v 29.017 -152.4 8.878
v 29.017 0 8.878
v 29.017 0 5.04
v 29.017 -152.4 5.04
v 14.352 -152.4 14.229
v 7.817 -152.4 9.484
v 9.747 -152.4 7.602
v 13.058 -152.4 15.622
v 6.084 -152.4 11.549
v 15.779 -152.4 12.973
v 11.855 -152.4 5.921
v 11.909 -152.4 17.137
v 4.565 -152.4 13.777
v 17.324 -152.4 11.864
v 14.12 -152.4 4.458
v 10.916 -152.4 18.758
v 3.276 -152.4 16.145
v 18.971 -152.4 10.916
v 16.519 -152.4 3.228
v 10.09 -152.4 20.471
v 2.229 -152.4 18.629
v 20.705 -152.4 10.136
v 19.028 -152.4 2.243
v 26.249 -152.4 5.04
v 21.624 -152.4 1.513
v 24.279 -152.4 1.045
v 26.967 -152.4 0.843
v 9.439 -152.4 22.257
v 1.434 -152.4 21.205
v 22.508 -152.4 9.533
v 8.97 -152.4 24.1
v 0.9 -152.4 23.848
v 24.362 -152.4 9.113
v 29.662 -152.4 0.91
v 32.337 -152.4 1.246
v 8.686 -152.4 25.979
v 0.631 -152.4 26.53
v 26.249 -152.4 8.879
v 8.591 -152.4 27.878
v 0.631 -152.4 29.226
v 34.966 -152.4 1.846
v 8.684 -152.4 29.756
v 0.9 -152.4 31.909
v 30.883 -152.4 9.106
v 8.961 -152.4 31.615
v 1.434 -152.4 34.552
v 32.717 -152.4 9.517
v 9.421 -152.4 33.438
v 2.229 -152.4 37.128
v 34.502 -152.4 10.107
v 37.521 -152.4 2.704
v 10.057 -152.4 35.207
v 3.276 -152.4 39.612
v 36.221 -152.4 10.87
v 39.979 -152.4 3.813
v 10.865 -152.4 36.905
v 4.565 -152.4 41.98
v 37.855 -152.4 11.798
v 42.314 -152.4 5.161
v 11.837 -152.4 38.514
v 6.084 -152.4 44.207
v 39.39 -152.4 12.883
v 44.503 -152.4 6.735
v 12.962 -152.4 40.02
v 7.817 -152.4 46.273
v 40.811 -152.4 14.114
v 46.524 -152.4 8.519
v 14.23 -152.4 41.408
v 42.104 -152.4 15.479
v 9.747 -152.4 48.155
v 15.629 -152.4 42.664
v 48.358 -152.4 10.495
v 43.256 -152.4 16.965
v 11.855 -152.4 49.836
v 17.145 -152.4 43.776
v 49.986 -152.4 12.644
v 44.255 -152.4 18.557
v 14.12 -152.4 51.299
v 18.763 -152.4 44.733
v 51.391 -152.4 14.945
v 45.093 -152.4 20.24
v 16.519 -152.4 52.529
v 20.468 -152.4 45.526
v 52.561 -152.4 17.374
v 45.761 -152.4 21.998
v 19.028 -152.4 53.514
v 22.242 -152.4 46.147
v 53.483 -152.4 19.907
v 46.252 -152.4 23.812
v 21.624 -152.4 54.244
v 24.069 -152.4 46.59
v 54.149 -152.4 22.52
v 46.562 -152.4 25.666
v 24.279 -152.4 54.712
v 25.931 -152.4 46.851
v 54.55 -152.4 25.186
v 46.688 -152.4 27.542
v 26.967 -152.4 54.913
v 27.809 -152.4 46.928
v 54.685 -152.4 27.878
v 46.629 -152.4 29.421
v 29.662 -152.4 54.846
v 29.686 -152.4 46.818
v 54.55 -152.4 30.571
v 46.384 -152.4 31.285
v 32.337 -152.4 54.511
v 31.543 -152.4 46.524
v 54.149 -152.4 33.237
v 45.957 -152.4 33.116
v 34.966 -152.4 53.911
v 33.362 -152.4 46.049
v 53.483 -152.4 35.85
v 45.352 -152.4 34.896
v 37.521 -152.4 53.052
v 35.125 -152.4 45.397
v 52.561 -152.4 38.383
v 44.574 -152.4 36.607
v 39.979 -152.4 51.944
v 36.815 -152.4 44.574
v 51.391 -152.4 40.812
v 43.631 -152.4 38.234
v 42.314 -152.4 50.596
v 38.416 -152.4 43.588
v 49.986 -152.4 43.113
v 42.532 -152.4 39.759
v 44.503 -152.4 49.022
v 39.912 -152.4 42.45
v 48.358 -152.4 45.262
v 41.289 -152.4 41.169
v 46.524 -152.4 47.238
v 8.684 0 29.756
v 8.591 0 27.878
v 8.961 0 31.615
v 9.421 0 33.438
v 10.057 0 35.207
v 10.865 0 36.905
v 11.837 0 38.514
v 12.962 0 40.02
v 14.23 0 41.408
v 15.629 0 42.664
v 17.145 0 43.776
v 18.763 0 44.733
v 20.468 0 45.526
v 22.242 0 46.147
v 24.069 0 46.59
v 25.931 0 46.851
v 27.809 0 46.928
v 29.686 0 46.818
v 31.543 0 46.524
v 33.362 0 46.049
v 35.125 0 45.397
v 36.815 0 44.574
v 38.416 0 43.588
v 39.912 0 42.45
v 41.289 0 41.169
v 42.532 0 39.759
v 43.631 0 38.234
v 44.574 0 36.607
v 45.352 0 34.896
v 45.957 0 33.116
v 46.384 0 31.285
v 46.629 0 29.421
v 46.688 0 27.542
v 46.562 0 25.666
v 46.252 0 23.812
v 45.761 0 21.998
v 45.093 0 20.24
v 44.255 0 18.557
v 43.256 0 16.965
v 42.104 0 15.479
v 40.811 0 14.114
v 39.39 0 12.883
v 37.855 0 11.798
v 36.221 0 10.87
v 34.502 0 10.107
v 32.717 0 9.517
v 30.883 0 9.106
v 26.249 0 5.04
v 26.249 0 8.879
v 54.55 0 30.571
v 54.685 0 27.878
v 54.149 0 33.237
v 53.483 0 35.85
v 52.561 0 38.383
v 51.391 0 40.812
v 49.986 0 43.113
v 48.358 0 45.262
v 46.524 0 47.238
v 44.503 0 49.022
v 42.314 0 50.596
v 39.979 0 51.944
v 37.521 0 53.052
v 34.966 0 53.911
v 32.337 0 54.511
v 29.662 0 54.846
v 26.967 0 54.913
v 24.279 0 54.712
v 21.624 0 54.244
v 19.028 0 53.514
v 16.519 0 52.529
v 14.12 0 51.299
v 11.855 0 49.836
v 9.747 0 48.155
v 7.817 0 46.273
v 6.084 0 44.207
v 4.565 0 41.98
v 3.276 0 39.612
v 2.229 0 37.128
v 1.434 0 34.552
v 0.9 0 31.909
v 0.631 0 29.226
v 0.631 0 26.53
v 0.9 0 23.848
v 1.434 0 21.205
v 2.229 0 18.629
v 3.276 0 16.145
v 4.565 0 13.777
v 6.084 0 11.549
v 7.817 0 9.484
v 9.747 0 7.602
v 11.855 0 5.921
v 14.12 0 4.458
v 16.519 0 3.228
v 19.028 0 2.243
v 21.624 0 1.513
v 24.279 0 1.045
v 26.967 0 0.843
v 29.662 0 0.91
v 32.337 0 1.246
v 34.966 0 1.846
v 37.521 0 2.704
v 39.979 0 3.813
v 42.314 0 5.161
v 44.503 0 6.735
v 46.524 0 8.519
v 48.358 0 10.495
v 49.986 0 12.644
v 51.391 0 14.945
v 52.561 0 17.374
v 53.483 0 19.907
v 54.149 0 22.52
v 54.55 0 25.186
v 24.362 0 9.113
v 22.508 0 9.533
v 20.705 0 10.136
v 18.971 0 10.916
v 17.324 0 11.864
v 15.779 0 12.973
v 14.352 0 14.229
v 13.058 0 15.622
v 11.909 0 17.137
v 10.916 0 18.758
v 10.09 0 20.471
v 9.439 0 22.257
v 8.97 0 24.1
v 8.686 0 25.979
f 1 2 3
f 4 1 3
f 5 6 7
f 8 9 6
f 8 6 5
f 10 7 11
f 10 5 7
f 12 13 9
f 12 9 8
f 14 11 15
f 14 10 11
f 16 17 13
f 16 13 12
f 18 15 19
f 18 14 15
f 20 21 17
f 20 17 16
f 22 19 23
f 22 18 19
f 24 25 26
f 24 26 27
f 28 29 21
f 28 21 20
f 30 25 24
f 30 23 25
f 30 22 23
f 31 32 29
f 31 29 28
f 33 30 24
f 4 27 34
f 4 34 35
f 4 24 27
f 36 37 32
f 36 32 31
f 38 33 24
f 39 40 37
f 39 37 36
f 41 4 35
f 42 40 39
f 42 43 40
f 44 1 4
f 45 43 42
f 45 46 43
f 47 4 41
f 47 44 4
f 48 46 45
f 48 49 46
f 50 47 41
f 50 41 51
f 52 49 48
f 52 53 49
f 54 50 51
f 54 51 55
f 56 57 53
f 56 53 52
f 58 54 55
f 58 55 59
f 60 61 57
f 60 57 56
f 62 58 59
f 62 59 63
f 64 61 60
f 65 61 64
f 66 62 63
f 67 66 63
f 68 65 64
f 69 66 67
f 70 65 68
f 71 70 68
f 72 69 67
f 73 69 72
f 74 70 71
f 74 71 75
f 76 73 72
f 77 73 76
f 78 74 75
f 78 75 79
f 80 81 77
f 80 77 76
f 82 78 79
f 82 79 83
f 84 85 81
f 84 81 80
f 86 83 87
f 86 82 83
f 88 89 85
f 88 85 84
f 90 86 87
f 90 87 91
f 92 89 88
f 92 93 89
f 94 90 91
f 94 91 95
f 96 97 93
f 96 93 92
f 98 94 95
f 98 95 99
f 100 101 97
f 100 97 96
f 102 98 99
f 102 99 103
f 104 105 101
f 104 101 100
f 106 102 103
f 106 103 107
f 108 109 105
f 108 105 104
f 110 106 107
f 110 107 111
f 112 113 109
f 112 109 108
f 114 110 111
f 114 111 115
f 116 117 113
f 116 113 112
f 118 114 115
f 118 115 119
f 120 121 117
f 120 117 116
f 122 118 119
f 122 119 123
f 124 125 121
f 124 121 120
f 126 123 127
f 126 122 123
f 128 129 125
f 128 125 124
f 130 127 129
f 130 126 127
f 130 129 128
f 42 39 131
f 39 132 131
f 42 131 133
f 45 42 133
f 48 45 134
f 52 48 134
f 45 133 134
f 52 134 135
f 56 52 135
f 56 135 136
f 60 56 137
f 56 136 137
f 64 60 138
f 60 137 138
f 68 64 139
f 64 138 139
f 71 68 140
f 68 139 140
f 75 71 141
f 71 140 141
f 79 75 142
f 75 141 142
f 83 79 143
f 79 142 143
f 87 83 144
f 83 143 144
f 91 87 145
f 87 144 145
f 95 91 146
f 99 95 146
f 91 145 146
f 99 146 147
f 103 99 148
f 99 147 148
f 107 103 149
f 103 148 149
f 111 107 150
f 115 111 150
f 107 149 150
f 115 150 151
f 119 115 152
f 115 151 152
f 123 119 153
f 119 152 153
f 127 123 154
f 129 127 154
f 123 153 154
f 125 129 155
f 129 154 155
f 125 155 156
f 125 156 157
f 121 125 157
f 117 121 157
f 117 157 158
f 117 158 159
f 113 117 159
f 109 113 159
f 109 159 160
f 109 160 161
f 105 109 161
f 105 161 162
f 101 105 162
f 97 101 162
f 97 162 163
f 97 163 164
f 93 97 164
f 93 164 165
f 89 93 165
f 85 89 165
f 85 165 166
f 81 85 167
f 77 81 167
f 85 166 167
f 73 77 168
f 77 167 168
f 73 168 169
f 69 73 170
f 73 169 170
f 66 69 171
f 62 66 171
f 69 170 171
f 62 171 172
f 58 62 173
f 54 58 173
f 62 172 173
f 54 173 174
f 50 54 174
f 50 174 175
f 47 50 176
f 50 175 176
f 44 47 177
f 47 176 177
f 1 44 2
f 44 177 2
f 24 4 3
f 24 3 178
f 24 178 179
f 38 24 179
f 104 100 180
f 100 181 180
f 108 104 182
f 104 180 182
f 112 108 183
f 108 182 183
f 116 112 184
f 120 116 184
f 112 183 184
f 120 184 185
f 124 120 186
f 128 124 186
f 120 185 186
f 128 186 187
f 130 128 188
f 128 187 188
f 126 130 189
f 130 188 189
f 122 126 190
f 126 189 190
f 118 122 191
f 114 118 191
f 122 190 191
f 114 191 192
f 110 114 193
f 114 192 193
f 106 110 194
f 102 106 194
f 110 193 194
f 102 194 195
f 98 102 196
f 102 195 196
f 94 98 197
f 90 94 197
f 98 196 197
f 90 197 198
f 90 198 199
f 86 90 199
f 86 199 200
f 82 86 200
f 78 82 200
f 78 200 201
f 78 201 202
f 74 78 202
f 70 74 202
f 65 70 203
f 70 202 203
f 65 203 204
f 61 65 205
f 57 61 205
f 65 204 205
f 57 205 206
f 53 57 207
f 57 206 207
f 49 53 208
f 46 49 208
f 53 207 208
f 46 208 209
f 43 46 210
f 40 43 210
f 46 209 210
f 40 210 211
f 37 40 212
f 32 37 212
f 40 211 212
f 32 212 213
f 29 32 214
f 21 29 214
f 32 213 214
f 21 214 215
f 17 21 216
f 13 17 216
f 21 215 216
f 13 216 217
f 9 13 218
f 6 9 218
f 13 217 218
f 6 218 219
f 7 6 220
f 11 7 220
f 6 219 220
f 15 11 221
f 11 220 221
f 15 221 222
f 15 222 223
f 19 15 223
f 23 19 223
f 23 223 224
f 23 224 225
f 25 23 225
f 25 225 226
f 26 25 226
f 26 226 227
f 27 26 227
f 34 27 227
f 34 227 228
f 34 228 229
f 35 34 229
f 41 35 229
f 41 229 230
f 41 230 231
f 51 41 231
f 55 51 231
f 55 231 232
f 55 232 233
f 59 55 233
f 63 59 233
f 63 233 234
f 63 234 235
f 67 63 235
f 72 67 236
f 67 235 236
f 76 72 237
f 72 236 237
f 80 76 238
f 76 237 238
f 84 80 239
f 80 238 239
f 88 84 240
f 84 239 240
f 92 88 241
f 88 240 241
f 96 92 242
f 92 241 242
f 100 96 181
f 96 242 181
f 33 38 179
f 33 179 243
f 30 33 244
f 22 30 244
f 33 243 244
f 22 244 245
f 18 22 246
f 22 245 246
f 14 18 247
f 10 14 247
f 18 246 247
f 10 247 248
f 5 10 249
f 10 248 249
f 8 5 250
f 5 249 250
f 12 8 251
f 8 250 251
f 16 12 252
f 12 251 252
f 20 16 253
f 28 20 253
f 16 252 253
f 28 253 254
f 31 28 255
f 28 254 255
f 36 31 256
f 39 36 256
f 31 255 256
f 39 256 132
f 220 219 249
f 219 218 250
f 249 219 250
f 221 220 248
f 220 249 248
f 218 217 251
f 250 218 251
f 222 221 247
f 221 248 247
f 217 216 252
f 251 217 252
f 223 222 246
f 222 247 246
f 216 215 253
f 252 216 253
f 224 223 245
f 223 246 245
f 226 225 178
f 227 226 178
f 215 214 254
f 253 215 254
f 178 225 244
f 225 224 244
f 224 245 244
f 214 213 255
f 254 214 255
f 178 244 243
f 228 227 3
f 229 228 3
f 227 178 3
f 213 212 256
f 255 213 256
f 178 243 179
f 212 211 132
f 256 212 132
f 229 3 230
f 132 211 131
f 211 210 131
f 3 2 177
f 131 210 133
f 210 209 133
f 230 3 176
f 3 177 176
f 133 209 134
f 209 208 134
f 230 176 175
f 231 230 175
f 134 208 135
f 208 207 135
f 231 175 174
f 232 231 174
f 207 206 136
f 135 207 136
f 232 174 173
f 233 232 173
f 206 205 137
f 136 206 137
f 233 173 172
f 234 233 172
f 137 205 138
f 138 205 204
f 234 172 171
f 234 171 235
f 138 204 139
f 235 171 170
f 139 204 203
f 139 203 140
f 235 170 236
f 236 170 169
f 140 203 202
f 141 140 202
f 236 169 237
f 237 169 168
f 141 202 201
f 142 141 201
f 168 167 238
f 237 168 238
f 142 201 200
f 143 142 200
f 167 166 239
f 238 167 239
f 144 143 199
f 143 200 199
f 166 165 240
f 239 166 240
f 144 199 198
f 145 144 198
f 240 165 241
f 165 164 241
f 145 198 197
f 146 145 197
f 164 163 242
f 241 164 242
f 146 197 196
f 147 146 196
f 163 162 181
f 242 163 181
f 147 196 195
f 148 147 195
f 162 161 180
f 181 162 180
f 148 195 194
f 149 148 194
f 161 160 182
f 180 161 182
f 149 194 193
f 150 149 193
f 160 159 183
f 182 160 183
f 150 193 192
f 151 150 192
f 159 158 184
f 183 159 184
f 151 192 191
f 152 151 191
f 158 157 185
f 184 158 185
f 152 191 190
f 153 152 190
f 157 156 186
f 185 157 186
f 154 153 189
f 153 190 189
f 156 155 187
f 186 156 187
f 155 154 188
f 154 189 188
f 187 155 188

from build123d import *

# Parameters (mm, degrees)
F0_R     = 27.0435400324
F1_DEPTH = 25.4
F3_D     = 38.1
F5_DEPTH = 25.4
F6_DEPTH = 127


with BuildPart() as f1:
    # F0 (on Front) → F1 (new body)
    with BuildSketch(Plane.XZ):
        with Locations((27.6412703097, 27.8783403337)):
            Circle(F0_R)
    extrude(amount=F1_DEPTH)

    # F3 (through all)
    with Locations(Plane.XZ.offset(25.4)):
        with Locations((27.6412703097, 27.8783403337)):
            Hole(F3_D / 2)

    # F4 (on face) → F5 (cut)
    with BuildSketch(Plane(origin=(0, 0, 0), x_dir=(-1, 0, 0), z_dir=(0, 1, 0))):
        with BuildLine():
            Line((-26.2493573993, 5.0403885543), (-26.2493573993, 8.8792593441))
            ThreePointArc((-26.2493573993, 8.8792593441), (-27.6329506683, 8.8283421504), (-29.0165878832, 8.8780508209))
            Line((-29.0165878832, 8.8780508209), (-29.0165878832, 5.0403885543))
            Line((-29.0165878832, 5.0403885543), (-26.2493573993, 5.0403885543))
        make_face()
    extrude(amount=-F5_DEPTH, mode=Mode.SUBTRACT)

    # F6 (add): a face of the model
    f6_faces = [f1.faces().sort_by_distance(p)[0] for p in [
        (1.362637099, -25.4, 27.8783403337),
    ]]
    extrude(f6_faces, amount=F6_DEPTH)


solid = f1.part
